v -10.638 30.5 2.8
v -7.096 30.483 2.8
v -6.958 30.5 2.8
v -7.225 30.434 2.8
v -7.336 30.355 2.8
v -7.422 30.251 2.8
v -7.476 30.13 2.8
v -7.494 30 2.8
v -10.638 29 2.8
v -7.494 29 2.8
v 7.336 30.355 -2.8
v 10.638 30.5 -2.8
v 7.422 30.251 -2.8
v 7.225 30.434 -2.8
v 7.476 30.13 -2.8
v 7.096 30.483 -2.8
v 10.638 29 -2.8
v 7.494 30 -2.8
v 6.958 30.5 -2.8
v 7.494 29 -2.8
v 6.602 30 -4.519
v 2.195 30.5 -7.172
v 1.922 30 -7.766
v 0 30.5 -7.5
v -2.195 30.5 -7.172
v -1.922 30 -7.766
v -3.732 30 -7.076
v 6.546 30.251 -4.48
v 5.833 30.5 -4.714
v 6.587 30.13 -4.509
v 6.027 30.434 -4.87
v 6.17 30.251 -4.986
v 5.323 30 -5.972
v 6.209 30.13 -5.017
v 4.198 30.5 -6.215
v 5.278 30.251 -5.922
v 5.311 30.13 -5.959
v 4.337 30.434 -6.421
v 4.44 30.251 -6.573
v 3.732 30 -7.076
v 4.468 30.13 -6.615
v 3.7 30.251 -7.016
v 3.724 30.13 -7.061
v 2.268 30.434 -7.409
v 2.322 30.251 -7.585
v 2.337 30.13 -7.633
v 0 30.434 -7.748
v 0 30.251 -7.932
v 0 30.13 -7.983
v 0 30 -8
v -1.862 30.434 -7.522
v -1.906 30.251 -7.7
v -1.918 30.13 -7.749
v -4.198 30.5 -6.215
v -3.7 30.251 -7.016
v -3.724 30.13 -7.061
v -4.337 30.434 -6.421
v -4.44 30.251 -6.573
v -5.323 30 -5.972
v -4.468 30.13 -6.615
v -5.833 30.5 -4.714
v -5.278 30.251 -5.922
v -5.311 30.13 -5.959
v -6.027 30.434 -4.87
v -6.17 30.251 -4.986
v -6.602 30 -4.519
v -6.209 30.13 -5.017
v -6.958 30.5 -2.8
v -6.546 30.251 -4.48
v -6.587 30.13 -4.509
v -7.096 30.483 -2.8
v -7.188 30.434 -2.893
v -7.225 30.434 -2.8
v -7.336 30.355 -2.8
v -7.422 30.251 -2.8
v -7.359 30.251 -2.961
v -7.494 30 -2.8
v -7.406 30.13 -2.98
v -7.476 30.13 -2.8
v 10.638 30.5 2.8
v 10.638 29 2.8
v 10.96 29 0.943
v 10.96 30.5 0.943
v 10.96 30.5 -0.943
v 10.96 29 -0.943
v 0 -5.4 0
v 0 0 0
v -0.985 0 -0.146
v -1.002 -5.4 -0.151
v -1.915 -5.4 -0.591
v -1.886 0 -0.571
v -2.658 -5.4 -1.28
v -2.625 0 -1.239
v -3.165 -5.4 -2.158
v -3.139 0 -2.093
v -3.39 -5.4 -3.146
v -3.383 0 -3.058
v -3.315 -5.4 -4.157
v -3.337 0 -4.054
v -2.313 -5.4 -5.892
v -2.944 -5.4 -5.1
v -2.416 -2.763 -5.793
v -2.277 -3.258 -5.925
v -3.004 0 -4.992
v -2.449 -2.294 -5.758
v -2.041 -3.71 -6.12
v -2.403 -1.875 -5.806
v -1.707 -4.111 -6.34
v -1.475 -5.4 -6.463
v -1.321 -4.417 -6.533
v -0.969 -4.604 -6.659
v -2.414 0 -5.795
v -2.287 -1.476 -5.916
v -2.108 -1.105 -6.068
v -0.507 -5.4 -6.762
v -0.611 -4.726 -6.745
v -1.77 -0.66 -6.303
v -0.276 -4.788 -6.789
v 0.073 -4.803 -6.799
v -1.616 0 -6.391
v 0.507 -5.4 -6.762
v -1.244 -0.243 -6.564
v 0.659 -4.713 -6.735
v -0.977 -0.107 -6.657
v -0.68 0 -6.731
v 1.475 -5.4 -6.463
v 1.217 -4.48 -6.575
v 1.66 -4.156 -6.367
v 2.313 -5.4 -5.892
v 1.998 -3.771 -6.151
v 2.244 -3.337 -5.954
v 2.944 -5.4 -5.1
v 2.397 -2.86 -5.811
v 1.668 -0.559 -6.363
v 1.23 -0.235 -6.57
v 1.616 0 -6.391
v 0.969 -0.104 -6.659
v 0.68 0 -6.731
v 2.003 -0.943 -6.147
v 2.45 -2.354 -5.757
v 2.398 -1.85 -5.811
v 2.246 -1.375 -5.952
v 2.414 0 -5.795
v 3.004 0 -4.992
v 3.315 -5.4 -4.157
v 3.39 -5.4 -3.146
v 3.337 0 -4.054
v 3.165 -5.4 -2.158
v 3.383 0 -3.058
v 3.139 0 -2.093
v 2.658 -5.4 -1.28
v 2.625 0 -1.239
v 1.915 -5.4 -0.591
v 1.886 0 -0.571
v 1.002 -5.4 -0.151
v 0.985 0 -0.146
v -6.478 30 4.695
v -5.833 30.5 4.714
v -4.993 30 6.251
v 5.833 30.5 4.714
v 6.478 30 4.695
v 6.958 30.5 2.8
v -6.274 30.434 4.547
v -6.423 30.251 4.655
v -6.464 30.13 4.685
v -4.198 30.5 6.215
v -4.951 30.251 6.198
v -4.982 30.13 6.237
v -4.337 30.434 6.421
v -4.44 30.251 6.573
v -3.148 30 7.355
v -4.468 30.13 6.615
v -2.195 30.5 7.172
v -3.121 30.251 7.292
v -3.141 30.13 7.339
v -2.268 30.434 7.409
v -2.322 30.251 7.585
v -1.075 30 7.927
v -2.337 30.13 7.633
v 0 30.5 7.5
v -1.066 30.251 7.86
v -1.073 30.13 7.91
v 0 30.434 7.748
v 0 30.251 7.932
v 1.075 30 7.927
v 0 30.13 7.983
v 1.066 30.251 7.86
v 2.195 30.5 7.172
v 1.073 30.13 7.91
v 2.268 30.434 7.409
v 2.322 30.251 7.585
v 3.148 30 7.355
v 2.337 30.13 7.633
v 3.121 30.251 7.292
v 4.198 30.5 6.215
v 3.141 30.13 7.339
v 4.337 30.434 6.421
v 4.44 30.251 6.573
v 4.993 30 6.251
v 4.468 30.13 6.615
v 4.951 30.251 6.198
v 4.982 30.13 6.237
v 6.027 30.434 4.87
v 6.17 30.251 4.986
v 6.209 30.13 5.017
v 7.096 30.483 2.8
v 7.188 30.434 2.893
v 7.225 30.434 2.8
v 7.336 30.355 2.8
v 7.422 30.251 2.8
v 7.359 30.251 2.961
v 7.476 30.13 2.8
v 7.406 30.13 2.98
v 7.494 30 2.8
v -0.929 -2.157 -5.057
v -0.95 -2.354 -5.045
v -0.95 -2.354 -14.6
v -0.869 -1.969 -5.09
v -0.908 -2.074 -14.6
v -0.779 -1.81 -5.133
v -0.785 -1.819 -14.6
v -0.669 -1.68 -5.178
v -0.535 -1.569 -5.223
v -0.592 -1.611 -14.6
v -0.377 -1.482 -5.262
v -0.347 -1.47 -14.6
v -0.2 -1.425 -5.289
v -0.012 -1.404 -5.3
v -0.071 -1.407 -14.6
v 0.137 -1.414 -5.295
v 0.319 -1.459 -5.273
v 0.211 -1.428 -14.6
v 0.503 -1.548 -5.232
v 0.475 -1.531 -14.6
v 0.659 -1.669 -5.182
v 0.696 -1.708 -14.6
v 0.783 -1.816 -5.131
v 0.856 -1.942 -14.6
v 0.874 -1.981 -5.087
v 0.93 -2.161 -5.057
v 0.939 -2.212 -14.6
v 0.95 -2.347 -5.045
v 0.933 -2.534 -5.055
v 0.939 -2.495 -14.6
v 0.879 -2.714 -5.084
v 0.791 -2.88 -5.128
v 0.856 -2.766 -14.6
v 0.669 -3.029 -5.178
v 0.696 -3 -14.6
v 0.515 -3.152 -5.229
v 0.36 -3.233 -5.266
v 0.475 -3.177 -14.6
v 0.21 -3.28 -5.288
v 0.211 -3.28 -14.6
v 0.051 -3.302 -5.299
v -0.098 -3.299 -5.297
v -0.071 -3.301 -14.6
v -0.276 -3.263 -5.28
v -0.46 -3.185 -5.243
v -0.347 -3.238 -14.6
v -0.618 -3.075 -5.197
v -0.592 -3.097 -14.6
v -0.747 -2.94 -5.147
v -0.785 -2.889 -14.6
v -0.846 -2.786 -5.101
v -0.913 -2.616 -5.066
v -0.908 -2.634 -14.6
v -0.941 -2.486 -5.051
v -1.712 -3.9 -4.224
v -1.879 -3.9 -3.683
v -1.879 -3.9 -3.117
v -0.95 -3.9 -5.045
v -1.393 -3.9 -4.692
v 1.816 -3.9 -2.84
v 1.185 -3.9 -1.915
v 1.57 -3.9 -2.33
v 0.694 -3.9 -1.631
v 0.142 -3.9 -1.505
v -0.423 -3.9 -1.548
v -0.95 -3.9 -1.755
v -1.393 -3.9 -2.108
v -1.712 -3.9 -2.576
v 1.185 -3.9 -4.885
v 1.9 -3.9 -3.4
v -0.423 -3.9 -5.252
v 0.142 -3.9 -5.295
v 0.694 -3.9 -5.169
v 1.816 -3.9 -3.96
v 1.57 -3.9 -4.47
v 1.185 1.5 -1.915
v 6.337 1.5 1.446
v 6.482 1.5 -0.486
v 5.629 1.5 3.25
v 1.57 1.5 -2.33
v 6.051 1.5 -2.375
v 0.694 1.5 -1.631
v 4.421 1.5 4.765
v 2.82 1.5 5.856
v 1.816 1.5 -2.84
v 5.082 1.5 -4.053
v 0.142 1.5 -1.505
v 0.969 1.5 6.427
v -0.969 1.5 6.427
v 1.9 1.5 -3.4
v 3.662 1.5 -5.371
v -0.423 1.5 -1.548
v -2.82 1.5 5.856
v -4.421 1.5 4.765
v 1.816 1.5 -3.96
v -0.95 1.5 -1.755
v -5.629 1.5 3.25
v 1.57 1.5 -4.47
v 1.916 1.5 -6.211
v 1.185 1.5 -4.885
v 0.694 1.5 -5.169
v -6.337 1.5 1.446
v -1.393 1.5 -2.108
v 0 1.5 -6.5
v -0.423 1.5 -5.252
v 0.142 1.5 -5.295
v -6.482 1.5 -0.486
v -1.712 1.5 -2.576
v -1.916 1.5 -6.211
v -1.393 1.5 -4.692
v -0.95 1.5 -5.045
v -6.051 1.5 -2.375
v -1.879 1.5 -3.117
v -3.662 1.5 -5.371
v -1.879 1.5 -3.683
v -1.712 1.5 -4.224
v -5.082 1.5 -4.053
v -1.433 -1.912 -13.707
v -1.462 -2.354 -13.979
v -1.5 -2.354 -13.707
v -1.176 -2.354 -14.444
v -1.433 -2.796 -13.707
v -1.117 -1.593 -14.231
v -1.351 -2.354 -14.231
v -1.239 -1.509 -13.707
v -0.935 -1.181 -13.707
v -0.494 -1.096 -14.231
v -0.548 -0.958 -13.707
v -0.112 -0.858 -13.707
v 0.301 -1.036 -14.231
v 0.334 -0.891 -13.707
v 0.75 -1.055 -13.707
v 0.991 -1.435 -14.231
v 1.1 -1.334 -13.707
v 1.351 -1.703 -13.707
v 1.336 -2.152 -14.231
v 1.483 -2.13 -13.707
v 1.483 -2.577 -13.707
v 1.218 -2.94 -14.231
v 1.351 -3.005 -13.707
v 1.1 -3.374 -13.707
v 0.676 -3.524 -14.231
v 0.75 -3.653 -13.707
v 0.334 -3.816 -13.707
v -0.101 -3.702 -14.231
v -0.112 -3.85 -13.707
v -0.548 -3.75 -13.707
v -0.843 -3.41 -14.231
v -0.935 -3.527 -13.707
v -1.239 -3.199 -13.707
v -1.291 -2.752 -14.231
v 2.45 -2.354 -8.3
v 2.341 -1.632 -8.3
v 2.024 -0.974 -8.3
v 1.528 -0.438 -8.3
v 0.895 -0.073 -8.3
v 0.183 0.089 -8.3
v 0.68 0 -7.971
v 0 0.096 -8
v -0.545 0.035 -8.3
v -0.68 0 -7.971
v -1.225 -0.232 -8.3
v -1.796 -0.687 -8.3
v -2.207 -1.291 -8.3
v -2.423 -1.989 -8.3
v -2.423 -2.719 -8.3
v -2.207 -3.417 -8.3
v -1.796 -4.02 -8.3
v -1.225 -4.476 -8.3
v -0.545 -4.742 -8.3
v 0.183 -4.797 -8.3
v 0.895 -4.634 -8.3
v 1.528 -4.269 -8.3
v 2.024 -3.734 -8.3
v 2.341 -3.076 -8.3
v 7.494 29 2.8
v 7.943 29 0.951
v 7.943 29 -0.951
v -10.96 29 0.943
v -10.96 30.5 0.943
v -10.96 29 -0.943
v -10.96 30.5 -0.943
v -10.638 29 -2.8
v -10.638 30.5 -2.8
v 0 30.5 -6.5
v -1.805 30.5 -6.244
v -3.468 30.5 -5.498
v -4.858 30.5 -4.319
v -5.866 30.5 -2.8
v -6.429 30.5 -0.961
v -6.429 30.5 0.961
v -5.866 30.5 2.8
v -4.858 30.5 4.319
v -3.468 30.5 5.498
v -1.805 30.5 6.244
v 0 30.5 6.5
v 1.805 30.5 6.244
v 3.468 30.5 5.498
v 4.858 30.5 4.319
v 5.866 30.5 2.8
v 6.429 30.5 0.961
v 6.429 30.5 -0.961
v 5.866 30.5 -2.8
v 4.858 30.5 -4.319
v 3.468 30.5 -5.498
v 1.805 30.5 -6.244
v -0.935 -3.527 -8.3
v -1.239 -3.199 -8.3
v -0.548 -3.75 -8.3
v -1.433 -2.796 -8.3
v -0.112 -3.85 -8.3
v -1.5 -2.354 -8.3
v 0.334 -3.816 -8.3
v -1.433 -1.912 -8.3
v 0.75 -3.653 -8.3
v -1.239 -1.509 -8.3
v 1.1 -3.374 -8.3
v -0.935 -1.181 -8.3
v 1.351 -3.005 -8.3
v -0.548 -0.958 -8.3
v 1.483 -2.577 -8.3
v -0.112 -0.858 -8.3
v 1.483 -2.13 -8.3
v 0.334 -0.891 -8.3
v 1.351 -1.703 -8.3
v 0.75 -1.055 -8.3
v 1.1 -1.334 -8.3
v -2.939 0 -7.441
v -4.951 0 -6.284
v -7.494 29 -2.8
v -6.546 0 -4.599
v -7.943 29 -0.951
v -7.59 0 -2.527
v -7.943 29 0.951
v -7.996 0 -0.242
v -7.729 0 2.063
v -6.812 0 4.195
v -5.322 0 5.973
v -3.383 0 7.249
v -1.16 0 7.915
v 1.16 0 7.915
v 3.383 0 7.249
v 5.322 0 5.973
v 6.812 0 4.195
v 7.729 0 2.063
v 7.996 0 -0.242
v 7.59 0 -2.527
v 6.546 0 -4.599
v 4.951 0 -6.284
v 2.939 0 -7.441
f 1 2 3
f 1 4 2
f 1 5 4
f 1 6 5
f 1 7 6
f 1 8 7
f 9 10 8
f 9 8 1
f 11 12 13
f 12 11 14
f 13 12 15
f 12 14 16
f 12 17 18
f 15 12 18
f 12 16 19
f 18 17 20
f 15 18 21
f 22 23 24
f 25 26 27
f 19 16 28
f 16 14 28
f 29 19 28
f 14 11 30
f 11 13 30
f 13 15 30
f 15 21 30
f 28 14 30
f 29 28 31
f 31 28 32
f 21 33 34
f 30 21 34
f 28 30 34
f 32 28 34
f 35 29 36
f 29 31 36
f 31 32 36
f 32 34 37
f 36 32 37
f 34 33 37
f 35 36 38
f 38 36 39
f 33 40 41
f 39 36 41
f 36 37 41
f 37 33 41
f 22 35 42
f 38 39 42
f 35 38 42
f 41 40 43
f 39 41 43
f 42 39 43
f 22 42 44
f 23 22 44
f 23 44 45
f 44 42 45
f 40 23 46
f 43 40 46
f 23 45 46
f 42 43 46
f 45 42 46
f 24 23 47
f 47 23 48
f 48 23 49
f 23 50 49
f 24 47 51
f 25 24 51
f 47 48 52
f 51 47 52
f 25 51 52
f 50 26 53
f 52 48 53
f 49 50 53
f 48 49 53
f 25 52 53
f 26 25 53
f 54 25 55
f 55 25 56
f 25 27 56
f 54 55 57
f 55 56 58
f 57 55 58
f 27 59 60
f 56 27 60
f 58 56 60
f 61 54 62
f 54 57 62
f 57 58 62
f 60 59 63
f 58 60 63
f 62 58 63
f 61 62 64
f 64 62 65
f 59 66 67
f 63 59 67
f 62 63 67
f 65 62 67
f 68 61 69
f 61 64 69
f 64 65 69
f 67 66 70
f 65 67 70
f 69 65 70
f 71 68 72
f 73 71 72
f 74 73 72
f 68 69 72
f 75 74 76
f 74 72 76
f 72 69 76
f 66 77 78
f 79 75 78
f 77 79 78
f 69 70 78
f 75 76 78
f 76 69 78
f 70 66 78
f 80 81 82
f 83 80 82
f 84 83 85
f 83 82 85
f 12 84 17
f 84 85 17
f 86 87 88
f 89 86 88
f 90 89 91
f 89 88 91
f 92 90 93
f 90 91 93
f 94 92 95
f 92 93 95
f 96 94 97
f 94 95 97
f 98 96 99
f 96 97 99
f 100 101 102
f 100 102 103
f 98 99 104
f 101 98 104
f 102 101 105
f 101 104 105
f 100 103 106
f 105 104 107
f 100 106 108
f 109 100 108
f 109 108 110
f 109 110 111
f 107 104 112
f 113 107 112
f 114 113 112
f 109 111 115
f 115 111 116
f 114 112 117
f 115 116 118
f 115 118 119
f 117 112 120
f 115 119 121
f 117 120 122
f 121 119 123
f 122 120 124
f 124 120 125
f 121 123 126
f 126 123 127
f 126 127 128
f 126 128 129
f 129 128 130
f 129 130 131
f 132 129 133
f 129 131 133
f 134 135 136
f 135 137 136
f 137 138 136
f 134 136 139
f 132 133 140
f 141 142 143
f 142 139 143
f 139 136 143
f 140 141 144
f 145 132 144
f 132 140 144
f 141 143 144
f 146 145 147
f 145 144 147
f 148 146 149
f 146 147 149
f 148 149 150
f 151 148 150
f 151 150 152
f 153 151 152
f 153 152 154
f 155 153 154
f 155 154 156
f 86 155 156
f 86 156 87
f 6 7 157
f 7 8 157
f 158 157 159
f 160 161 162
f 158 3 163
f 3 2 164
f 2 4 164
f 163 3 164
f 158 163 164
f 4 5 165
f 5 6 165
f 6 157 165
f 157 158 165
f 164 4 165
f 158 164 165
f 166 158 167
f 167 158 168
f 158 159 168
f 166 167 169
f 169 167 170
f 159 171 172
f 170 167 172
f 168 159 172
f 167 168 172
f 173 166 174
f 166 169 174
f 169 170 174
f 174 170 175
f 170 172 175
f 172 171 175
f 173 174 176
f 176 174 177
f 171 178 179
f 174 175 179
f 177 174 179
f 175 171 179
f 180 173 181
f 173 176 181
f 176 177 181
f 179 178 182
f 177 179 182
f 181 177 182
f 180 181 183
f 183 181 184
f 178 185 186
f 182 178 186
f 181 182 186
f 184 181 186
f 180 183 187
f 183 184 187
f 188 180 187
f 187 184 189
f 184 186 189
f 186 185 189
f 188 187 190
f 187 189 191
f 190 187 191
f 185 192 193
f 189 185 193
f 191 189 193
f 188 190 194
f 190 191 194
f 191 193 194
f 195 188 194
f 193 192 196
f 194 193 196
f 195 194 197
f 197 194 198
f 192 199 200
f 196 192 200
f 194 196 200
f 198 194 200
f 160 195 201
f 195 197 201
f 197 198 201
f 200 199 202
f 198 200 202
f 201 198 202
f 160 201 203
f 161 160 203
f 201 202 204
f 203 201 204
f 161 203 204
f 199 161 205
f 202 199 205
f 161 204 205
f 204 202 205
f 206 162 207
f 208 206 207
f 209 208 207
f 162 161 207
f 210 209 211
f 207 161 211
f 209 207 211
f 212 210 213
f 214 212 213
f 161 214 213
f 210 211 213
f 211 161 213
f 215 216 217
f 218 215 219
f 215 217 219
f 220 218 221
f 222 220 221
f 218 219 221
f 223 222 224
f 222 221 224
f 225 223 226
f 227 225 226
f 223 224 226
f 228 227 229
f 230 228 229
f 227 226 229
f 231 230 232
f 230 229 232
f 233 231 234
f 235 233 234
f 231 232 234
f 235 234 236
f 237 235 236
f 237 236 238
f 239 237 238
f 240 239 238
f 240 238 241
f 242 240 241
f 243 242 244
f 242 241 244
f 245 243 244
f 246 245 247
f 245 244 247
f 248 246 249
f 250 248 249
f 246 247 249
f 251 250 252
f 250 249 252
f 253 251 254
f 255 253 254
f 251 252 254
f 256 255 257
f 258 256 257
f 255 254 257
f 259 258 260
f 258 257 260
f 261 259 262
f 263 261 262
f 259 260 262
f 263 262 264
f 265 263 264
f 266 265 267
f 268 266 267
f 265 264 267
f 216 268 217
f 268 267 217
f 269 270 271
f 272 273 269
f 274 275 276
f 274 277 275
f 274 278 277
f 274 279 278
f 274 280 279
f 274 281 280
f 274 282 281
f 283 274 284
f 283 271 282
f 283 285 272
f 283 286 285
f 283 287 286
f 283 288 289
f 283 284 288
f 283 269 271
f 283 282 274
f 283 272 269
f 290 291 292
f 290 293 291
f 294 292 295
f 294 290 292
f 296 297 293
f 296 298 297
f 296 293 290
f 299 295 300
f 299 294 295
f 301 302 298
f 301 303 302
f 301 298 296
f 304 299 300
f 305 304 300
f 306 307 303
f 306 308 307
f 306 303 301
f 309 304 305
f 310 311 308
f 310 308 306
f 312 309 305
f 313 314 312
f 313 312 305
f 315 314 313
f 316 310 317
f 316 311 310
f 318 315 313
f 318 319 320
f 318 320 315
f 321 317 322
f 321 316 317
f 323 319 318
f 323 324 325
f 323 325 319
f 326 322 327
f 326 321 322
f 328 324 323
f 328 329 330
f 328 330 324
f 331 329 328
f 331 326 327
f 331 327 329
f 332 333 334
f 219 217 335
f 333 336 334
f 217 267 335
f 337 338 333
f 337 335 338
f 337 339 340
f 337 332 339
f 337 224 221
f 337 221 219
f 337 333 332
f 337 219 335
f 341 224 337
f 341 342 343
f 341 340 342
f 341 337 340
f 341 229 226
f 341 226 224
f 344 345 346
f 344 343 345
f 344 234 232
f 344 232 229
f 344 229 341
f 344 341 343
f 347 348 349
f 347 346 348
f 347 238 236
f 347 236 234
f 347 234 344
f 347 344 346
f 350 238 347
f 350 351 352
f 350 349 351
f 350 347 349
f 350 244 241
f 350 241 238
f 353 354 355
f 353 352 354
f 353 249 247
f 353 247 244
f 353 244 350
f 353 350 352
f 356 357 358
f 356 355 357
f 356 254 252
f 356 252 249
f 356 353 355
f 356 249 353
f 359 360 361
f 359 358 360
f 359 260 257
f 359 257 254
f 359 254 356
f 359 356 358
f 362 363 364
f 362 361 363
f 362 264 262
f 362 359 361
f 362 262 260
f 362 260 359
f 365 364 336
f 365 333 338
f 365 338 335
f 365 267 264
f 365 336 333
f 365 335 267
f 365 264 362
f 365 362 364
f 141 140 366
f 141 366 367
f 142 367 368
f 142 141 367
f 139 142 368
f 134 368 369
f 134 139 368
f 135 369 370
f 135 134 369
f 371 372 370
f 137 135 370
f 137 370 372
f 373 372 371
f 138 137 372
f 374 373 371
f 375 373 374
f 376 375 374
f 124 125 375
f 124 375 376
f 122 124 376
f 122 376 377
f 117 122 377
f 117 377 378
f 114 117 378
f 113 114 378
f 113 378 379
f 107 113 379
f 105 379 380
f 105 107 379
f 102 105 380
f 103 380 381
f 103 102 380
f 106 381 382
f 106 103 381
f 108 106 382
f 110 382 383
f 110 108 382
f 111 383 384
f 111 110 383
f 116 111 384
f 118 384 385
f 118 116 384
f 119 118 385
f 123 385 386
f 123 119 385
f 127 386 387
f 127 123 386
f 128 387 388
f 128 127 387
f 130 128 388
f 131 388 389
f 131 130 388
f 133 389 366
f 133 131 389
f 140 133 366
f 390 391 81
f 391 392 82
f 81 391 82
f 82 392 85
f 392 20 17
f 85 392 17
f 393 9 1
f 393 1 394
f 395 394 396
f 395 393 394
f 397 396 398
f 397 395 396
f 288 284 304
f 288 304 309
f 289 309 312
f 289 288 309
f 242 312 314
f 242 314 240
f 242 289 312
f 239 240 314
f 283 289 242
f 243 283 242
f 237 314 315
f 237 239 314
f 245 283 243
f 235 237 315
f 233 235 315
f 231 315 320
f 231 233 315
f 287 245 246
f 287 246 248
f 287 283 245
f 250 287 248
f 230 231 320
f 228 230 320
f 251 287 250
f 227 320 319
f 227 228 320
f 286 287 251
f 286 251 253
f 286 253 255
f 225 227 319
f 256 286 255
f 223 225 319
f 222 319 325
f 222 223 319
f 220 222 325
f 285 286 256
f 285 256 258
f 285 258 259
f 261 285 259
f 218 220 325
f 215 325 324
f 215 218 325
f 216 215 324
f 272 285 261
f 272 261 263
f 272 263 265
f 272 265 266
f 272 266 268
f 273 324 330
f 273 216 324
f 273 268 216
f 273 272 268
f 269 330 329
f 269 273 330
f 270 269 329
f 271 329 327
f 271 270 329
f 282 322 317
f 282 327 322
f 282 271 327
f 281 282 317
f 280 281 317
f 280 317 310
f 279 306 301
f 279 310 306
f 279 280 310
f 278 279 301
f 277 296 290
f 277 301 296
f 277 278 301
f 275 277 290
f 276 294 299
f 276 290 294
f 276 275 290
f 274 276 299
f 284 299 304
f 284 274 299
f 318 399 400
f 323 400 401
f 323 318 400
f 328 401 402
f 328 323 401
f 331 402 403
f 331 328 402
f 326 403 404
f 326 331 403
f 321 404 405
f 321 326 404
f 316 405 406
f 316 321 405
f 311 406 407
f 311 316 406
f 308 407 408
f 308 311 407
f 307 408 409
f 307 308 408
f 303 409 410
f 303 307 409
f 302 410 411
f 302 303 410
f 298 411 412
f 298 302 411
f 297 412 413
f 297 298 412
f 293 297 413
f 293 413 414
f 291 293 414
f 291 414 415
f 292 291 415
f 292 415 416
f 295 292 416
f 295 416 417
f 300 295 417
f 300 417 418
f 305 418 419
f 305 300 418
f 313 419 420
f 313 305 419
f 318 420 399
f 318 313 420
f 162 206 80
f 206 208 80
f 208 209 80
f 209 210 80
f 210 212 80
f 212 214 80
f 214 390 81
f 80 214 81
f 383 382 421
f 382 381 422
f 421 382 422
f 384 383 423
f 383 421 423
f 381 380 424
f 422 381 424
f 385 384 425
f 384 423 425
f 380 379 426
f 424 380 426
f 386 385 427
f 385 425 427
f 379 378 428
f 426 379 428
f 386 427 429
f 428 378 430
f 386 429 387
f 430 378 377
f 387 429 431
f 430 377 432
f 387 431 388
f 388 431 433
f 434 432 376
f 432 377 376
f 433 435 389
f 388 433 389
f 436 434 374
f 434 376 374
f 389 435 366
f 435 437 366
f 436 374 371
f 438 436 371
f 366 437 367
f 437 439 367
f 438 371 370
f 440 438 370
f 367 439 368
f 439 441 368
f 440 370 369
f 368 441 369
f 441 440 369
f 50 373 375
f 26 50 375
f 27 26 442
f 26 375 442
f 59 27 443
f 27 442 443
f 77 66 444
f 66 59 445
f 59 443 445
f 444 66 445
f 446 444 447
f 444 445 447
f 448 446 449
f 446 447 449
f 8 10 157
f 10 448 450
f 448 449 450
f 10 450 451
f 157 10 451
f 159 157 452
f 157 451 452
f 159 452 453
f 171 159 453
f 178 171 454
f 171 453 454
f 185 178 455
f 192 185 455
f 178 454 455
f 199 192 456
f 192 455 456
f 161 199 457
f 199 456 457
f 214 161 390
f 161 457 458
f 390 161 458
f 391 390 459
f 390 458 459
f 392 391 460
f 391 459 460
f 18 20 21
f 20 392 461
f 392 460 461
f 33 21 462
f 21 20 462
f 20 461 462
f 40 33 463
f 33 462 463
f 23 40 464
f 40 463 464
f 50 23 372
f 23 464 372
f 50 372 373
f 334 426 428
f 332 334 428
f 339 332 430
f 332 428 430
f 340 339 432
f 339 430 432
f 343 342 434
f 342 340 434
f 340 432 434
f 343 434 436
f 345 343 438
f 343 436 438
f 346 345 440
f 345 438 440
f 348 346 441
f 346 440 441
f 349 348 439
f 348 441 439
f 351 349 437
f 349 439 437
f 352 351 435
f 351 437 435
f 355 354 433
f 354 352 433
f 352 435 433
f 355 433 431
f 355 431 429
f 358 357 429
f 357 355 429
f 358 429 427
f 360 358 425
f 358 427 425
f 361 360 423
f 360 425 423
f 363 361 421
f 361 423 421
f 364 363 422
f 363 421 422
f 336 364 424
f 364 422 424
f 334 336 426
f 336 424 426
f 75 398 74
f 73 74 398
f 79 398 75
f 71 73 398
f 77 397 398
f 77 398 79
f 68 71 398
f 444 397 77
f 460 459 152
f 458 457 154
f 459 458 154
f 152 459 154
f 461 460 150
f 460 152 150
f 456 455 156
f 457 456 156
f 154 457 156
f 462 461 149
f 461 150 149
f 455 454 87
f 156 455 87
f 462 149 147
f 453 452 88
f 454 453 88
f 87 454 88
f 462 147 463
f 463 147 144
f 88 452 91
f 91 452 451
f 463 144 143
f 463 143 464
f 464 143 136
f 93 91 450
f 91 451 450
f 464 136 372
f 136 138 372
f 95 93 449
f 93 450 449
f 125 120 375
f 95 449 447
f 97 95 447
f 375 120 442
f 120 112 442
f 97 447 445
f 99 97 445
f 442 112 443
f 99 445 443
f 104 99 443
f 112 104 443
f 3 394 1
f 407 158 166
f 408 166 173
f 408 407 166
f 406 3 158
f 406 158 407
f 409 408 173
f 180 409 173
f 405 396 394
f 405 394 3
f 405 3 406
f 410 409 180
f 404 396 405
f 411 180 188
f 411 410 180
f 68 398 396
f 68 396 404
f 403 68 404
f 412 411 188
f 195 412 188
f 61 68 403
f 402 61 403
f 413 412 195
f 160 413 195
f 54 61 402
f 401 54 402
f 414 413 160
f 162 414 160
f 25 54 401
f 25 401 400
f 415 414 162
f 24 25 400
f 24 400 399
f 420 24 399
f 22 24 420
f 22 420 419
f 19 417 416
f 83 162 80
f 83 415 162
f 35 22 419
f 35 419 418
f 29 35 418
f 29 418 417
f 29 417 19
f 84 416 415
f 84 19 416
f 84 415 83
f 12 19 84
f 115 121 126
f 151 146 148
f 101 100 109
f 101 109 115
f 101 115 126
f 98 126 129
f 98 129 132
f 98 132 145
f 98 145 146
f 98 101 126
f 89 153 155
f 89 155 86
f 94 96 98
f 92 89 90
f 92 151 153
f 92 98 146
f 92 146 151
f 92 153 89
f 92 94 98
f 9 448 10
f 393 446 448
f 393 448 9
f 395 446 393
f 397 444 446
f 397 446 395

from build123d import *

# Parameters (mm, degrees)
SKETCH1_R           = 8
BOSS_EXTRUDE1_DEPTH = 30.5
SHELL1_T            = -1.5
SKETCH2_R           = 3.4
BOSS_EXTRUDE2_DEPTH = 5.4
SHELL2_START        = -3.9
SHELL2_OUTLINE_R    = 1.9
SHELL2_DEPTH        = 5.4
SKETCH5_R           = 2.45
BOSS_EXTRUDE5_DEPTH = 4.9
SKETCH6_R           = 1.5
BOSS_EXTRUDE6_DEPTH = 6.3
SKETCH7_R           = 0.95
CUT_EXTRUDE1_DEPTH  = 11.3
SKETCH8_R           = 1.9
CUT_EXTRUDE2_DEPTH  = 39.216750365
FILLET1_R           = 1
FILLET2_R           = 0.5
BOSS_EXTRUDE7_START = -1.5
BOSS_EXTRUDE7_DEPTH = 1.5


# Read off the part's stored shape, not the designer's step: Shell2
with BuildPart() as part:
    # Sketch1 → Boss-Extrude1 (new body)
    with BuildSketch(Plane(origin=(0, 0, 0), x_dir=(1, 0, 0), z_dir=(0, 1, 0))):
        with Locations(Location((0, 0, 0), (0, 0, 90))):
            Circle(SKETCH1_R)
    extrude(amount=BOSS_EXTRUDE1_DEPTH)

    # Shell1
    shell1_openings = [part.faces().sort_by_distance(p)[0] for p in [
        (0, 30.5, 0),
    ]]
    offset(amount=SHELL1_T, openings=shell1_openings, kind=Kind.INTERSECTION)

    # Sketch2 → Boss-Extrude2 (add)
    with BuildSketch(Plane.XZ):
        with Locations(Location((0, -3.4, 0), (0, 0, 90))):
            Circle(SKETCH2_R)
    extrude(amount=BOSS_EXTRUDE2_DEPTH)

    # Shell2 outline → Shell2 (cut)
    with BuildSketch(Plane(origin=(0, 0, 0), x_dir=(1, 0, 0), z_dir=(0, 1, 0)).offset(SHELL2_START)):
        with Locations((0, 3.4)):
            Circle(SHELL2_OUTLINE_R)
    extrude(amount=SHELL2_DEPTH, mode=Mode.SUBTRACT)

    # Sketch5 → Boss-Extrude5 (add)
    with BuildSketch(Plane.XY.offset(-3.4)):
        with Locations((0, -2.35384725)):
            Circle(SKETCH5_R)
    extrude(amount=-BOSS_EXTRUDE5_DEPTH)

    # Sketch6 → Boss-Extrude6 (add)
    with BuildSketch(Plane(origin=(0, 0, -8.3), x_dir=(-1, 0, 0), z_dir=(0, 0, -1))):
        with Locations((0, -2.35384725)):
            Circle(SKETCH6_R)
    extrude(amount=BOSS_EXTRUDE6_DEPTH)

    # Sketch7 → Cut-Extrude1 (cut)
    with BuildSketch(Plane(origin=(0, 0, -14.6), x_dir=(-1, 0, 0), z_dir=(0, 0, -1))):
        with Locations((0, -2.35384725)):
            Circle(SKETCH7_R)
    extrude(amount=-CUT_EXTRUDE1_DEPTH, mode=Mode.SUBTRACT)

    # Sketch8 → Cut-Extrude2 (cut, through all)
    with BuildSketch(Plane(origin=(0, -3.9, 0), x_dir=(1, 0, 0), z_dir=(0, 1, 0))):
        with Locations(Location((0, 3.4, 0), (0, 0, 270))):
            Circle(SKETCH8_R)
    extrude(amount=CUT_EXTRUDE2_DEPTH, mode=Mode.SUBTRACT)

    # Fillet1
    # the kernel refuses this fillet: 1 mm, written as the material it takes off along each edge
    with BuildSketch(Plane(origin=(0, -2.35384725, -14.6), x_dir=(-1, 0, 0), z_dir=(0, -1, 0))) as fillet1_piece_1:
        with BuildLine():
            CenterArc((0.5, -0.893028555), FILLET1_R, 0, 63.25631605)
            Line((1.5, -0.893028555), (1.52, -0.893028555))
            Line((1.52, -0.893028555), (1.52, 0))
            Line((1.52, 0), (1.5, 0.02))
            ThreePointArc((1.5, 0.02), (1.225, 0.02), (0.959, 0.017860571))
            Line((0.959, 0.017860571), (0.95, 0))
        make_face()
    revolve(axis=Axis((0, -2.35384725, -14.6), (0, 0, -1)), mode=Mode.SUBTRACT)

    # Fillet2
    fillet2_edges = [part.edges().sort_by_distance(p)[0] for p in [
        (0, 30.5, 8),
    ]]
    fillet(fillet2_edges, radius=FILLET2_R)

    # Sketch9 → Boss-Extrude7 (add)
    with BuildSketch(Plane(origin=(0, 30.5, 0), x_dir=(1, 0, 0), z_dir=(0, 1, 0)).offset(BOSS_EXTRUDE7_START)):
        with BuildLine():
            Line((-10.637668918, 2.8), (-5.86600375, 2.8))
            ThreePointArc((-5.86600375, 2.8), (-6.5, 0), (-5.86600375, -2.8))
            Line((-5.86600375, -2.8), (-10.637668918, -2.8))
            ThreePointArc((-10.637668918, -2.8), (-11, 0), (-10.637668918, 2.8))
        make_face()
    extrude(amount=BOSS_EXTRUDE7_DEPTH)

    # Mirror1: part across plane


with BuildPart() as part_1:
    add(part.part)
    add(part.part.mirror(Plane(origin=(0, 0, 0), x_dir=(0, 0, 1), z_dir=(1, 0, 0))))


solid = part_1.part
